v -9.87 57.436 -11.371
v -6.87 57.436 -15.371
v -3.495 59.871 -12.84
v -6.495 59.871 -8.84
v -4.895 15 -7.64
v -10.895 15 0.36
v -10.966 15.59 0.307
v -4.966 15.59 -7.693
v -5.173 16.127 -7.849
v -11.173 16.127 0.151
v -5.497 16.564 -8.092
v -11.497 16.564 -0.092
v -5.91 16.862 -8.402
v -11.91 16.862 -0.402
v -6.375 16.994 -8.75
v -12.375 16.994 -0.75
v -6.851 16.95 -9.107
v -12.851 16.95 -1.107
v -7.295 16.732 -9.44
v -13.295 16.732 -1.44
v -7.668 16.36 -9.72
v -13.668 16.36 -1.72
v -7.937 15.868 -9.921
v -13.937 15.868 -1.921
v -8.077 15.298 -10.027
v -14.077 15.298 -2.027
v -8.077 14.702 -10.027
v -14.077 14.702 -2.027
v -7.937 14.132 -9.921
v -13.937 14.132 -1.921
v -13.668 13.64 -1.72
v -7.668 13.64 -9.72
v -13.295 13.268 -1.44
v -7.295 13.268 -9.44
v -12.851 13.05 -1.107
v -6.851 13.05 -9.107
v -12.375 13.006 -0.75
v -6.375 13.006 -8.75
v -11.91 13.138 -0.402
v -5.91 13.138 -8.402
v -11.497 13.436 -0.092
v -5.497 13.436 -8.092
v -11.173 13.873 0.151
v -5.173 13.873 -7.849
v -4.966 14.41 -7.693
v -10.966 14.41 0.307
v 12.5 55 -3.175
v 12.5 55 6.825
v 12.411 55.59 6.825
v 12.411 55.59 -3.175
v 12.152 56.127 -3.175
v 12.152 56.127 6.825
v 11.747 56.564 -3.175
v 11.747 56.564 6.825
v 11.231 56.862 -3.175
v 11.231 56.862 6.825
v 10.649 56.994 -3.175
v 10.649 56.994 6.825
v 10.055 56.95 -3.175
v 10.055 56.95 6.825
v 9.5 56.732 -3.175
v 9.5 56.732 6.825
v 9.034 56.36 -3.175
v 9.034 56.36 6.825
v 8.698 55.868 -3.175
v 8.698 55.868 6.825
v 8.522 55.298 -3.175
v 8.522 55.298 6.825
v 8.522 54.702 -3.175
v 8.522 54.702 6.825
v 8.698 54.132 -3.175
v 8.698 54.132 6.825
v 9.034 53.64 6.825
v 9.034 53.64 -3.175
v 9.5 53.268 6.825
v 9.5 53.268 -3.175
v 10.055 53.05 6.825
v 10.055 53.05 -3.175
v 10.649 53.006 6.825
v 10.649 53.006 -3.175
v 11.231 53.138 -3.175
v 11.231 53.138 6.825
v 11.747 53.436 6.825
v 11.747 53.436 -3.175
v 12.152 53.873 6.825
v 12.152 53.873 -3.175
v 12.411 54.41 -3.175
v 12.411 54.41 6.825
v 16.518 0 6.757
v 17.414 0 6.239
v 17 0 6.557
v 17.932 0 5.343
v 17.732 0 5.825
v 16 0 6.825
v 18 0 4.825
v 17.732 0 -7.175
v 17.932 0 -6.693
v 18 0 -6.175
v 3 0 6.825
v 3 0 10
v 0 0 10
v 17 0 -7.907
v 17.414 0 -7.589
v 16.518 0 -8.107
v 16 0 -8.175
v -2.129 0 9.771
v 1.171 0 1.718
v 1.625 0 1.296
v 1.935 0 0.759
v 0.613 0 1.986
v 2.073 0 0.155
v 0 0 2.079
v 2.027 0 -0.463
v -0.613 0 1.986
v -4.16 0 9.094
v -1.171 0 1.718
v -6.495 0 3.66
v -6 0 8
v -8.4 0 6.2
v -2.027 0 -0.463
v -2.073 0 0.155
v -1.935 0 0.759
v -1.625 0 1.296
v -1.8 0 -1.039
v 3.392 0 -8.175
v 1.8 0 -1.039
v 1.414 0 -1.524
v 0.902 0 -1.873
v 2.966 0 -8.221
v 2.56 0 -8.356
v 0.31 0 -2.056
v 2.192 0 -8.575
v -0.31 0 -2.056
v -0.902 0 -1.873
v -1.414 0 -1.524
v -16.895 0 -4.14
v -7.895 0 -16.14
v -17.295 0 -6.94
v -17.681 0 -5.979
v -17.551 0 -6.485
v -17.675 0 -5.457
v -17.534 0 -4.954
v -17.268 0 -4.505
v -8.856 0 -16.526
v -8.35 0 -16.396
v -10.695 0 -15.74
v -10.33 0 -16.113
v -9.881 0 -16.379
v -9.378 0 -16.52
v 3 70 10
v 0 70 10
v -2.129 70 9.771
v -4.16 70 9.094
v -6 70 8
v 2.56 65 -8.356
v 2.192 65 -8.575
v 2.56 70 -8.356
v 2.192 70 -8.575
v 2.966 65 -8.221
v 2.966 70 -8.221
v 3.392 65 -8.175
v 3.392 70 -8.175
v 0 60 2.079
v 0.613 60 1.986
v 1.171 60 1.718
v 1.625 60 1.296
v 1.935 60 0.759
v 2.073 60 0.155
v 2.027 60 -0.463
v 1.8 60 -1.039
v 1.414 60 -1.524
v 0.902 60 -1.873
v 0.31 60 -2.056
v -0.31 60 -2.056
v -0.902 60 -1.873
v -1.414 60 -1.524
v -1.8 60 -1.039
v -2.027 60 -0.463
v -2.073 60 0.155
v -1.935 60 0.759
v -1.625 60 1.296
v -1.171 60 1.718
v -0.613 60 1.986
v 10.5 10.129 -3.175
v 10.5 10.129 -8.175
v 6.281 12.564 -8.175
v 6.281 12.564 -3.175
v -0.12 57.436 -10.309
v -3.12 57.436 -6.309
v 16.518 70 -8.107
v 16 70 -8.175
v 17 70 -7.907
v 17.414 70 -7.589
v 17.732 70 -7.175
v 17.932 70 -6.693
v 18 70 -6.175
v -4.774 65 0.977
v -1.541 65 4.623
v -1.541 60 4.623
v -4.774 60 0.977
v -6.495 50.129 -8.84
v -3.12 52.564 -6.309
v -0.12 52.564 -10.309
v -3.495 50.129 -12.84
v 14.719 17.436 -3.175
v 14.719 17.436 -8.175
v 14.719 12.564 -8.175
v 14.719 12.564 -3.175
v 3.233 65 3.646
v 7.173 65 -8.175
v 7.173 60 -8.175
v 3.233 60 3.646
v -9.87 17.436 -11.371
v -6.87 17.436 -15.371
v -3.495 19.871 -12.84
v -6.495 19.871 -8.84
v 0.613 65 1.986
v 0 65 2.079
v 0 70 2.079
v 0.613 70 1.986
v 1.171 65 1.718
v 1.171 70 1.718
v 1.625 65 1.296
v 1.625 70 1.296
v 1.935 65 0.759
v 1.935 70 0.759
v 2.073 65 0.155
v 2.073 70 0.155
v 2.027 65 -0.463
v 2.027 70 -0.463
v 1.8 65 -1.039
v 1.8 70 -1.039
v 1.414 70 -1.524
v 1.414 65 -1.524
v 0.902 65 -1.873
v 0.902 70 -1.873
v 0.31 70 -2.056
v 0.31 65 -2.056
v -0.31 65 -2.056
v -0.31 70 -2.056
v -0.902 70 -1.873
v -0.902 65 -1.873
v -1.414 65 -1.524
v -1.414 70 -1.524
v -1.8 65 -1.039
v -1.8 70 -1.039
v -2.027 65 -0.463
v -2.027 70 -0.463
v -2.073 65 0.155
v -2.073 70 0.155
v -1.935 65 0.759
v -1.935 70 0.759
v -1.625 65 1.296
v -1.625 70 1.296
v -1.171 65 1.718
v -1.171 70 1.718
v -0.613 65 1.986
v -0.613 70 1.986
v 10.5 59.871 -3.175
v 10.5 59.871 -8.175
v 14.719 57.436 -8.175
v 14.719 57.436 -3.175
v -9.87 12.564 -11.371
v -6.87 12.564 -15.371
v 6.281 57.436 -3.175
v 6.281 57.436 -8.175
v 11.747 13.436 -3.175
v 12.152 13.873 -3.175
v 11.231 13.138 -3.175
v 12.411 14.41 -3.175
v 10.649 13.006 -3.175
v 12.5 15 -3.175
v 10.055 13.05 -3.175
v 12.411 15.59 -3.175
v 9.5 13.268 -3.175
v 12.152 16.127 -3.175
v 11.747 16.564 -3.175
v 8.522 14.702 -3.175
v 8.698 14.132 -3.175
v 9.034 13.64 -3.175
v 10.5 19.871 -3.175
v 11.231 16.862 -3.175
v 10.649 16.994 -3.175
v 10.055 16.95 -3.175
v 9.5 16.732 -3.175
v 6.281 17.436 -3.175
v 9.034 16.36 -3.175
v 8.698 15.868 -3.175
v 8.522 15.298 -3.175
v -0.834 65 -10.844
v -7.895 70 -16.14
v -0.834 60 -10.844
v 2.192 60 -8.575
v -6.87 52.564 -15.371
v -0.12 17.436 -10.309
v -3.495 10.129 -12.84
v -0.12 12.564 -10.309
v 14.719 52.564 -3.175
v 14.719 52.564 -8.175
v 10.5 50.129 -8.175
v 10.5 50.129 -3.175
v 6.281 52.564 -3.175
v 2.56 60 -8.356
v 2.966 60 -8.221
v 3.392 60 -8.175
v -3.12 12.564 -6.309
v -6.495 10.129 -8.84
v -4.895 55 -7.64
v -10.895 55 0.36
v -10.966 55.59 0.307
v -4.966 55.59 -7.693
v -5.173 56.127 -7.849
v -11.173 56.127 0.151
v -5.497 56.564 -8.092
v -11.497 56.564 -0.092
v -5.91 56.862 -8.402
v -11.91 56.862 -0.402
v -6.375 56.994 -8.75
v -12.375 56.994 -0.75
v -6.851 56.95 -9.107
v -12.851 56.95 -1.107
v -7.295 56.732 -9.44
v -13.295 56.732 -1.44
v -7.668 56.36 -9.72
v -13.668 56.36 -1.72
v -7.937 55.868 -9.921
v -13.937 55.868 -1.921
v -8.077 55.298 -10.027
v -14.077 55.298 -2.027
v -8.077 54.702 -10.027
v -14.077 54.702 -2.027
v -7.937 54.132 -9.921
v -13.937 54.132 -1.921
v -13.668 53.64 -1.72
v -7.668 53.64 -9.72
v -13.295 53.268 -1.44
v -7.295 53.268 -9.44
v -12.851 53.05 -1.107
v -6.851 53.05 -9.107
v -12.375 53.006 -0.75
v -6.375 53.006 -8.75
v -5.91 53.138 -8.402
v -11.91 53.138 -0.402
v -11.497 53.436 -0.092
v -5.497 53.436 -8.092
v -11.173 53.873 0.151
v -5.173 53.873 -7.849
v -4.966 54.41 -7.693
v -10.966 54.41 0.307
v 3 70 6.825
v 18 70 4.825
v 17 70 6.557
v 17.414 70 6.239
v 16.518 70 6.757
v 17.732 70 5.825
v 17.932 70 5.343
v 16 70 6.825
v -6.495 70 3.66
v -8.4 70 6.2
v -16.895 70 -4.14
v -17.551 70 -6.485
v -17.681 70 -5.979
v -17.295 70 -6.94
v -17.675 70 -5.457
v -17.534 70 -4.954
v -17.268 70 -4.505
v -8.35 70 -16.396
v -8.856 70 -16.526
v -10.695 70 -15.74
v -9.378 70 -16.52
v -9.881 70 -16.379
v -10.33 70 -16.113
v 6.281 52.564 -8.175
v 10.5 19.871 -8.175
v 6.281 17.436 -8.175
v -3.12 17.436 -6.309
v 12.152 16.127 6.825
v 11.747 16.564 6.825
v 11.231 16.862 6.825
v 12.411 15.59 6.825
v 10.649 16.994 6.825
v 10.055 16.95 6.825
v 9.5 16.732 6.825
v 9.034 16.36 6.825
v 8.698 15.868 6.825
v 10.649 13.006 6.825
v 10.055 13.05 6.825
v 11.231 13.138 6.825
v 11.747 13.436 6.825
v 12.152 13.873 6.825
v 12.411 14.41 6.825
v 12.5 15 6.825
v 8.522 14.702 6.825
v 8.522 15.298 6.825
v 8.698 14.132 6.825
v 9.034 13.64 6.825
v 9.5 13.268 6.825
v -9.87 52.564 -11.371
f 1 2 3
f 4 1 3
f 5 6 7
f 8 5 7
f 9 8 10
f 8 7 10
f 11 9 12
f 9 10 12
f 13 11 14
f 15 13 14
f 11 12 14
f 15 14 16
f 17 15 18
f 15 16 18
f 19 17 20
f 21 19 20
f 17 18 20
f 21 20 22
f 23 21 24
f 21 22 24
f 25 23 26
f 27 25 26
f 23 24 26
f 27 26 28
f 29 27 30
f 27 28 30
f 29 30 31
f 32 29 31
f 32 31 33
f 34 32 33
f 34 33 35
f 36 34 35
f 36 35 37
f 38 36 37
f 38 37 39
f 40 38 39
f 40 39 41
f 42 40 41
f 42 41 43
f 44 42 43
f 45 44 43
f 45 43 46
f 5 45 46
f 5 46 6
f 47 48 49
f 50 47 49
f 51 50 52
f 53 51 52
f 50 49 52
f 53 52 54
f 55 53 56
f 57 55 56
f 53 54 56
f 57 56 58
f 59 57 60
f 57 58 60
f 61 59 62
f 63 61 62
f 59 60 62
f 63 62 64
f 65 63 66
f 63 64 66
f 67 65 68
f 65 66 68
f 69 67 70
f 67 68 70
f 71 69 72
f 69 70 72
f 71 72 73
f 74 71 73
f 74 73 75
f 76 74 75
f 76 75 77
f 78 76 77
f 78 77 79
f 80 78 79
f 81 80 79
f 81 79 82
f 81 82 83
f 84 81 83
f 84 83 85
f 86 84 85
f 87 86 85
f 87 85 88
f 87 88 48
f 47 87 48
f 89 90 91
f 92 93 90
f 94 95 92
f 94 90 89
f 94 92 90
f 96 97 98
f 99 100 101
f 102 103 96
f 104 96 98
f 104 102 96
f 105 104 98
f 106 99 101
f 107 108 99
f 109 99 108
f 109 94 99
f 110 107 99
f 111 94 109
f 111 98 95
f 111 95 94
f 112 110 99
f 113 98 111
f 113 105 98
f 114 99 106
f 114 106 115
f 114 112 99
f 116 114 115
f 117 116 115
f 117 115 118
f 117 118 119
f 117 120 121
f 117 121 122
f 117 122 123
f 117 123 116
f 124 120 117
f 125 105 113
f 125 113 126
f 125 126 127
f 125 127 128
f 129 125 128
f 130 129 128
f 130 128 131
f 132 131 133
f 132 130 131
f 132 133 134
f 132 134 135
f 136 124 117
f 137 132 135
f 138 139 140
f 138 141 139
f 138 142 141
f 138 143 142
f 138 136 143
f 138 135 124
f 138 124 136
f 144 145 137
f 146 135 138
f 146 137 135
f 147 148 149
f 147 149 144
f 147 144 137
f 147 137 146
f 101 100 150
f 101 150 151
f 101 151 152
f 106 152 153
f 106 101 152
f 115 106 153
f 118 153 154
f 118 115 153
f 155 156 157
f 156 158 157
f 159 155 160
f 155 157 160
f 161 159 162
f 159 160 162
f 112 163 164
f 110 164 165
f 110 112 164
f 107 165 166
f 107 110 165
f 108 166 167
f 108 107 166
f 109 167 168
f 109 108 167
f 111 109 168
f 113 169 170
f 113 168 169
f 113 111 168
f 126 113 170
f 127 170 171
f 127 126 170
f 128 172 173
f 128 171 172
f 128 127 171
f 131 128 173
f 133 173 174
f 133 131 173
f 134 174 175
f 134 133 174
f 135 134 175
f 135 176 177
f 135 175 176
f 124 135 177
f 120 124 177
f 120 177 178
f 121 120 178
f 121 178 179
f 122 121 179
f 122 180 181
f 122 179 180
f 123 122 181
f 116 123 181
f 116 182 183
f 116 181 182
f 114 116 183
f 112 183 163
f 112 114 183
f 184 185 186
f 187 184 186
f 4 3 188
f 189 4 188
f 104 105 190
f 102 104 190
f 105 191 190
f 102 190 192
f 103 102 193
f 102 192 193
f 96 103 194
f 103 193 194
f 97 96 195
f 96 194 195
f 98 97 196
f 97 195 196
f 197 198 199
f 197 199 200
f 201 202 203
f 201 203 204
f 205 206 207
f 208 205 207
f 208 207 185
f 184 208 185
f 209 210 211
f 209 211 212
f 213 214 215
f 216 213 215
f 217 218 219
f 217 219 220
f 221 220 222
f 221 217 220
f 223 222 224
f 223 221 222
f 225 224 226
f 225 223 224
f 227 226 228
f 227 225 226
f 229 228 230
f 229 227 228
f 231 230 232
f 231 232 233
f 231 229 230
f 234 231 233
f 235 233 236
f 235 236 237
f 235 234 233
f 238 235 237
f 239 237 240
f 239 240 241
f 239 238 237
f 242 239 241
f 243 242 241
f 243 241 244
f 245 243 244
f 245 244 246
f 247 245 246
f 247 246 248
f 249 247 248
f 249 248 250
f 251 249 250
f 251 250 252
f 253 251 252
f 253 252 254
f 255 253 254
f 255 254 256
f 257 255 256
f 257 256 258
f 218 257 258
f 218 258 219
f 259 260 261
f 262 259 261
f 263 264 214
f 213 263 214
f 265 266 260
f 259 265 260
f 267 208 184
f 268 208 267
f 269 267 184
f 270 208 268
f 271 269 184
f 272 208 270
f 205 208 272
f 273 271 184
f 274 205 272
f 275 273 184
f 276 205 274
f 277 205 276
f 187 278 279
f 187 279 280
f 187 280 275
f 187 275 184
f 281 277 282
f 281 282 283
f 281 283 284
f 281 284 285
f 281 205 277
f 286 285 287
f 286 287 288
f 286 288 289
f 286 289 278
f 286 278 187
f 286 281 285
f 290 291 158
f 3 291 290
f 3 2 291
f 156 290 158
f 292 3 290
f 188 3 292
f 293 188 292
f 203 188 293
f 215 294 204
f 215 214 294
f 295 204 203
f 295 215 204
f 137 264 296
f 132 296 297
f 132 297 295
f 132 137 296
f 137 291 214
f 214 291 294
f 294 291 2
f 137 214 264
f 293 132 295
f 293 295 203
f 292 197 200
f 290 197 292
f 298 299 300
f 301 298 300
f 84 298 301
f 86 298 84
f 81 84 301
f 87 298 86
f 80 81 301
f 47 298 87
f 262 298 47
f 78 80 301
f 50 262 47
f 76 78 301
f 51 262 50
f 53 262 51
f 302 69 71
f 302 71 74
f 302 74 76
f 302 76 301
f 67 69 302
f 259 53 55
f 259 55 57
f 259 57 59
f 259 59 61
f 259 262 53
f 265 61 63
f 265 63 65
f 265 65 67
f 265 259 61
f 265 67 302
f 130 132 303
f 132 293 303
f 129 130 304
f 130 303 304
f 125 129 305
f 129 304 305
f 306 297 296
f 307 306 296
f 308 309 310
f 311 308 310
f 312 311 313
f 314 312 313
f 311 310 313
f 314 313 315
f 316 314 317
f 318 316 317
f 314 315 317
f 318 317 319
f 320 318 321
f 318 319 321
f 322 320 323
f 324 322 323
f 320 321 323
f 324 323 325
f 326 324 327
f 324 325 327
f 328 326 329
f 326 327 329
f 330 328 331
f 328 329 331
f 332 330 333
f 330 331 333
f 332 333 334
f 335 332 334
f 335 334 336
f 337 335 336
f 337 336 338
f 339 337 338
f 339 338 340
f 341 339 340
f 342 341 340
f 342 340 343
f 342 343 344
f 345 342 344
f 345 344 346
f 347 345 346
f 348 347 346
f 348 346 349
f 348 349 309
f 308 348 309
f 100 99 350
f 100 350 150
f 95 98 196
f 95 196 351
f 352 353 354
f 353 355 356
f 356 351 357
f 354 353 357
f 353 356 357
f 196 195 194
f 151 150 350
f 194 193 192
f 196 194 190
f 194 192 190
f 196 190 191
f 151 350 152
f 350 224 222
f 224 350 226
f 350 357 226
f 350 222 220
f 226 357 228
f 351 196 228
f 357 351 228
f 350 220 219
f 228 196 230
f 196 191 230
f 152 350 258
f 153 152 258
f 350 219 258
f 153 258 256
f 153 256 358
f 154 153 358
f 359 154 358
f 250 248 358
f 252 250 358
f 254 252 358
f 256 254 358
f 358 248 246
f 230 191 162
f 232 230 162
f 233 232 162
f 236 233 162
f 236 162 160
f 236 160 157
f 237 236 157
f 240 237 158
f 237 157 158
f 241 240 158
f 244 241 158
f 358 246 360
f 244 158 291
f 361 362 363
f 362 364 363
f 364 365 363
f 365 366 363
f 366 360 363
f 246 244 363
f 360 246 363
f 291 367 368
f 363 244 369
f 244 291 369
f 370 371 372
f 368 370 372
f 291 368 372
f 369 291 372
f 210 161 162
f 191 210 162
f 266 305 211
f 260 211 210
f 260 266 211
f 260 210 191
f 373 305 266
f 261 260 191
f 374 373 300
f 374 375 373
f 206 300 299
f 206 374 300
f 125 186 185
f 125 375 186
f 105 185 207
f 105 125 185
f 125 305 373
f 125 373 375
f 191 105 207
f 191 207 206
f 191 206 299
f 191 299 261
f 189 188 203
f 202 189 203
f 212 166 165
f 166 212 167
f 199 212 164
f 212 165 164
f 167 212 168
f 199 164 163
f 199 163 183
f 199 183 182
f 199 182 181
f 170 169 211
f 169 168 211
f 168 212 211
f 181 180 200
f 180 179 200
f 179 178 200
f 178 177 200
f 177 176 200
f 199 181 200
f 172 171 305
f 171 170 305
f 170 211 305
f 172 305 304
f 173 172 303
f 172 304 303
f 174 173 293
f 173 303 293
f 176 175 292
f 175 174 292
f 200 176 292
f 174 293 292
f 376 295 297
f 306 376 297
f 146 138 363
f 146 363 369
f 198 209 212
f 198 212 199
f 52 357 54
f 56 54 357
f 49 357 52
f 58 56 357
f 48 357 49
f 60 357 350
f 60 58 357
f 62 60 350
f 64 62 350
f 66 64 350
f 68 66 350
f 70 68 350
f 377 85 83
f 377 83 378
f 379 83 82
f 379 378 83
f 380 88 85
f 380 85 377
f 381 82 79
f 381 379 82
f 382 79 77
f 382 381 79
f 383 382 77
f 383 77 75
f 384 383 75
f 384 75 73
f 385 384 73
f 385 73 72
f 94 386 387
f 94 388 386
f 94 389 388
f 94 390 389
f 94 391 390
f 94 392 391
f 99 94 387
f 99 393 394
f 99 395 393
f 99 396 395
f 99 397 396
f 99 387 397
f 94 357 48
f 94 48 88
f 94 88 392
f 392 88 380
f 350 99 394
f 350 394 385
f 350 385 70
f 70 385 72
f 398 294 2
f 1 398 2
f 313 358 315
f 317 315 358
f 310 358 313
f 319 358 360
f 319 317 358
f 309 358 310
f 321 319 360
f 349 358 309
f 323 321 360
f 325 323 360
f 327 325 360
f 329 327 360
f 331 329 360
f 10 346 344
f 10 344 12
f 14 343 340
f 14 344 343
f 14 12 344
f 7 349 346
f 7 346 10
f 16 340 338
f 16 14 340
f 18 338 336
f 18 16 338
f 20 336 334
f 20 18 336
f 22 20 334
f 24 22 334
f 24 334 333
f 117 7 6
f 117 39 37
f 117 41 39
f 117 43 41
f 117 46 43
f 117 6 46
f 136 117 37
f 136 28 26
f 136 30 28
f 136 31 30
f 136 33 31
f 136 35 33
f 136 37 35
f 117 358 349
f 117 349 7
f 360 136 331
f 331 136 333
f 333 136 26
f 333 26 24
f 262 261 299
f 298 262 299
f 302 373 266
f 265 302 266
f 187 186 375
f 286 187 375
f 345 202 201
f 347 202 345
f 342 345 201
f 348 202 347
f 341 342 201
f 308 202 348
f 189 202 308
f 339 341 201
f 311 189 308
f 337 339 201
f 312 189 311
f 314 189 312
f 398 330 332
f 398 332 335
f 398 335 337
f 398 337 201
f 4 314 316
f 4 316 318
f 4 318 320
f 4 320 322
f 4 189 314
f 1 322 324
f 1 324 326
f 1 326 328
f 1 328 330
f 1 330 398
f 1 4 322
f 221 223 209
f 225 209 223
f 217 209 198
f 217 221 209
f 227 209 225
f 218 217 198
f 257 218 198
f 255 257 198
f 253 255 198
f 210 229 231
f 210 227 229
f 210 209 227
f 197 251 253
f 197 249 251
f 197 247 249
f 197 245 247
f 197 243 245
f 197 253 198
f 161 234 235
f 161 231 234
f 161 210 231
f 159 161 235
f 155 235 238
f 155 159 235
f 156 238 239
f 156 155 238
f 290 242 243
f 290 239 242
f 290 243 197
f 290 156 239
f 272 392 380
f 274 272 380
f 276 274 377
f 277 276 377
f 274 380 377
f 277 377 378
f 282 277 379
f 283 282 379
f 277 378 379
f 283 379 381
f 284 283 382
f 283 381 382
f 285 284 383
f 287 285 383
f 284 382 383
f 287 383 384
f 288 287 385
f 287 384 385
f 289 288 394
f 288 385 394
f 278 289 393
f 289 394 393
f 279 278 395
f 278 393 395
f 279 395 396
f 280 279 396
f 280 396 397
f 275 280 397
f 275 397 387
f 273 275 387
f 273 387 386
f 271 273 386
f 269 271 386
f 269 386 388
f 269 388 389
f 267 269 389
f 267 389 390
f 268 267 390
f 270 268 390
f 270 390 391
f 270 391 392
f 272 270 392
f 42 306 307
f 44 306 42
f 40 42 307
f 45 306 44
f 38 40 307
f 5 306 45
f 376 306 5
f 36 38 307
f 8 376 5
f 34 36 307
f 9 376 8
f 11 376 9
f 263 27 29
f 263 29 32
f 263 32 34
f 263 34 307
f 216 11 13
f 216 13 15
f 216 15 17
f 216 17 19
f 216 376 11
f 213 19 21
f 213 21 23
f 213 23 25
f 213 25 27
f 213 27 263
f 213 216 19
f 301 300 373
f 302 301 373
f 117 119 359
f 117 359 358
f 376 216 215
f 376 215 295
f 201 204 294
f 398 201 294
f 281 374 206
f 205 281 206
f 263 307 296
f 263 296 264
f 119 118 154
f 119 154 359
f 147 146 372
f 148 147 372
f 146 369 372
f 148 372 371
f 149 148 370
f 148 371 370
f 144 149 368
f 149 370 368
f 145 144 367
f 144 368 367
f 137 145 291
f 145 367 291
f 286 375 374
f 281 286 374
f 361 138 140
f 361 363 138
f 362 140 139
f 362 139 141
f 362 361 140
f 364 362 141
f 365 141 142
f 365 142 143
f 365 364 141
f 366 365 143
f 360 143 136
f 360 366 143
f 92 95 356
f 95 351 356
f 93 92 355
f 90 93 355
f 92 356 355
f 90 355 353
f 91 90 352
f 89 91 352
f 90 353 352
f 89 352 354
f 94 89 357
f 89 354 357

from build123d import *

# Parameters (mm, degrees)
SKETCH1_R           = 2.0788
BOSS_EXTRUDE1_DEPTH = 70
SKETCH2_R           = 2
CUT_EXTRUDE1_DEPTH  = 15
SKETCH3_R           = 2
CUT_EXTRUDE2_DEPTH  = 15
CUT_EXTRUDE3_DEPTH  = 5
CUT_EXTRUDE4_DEPTH  = 5
CUT_EXTRUDE5_START  = -5
CUT_EXTRUDE5_DEPTH  = 5
FILLET1_R           = 2


with BuildPart() as part:
    # Sketch1 → Boss-Extrude1 (new body)
    with BuildSketch(Plane(origin=(0, 0, 0), x_dir=(1, 0, 0), z_dir=(0, 1, 0))):
        with BuildLine():
            Line((-18.495, 5.34), (-9.495, 17.34))
            Line((-9.495, 17.34), (2.725, 8.175))
            Line((2.725, 8.175), (18, 8.175))
            Line((18, 8.175), (18, -6.825))
            Line((18, -6.825), (3, -6.825))
            Line((3, -6.825), (3, -10))
            Line((3, -10), (0, -10))
            ThreePointArc((0, -10), (-3.16227766, -9.486832981), (-6, -8))
            Line((-6, -8), (-8.4, -6.2))
            Line((-8.4, -6.2), (-6.495, -3.66))
            Line((-6.495, -3.66), (-18.495, 5.34))
        make_face()
        with Locations(Location((0, 0, 0), (0, 0, 270))):
            Circle(SKETCH1_R, mode=Mode.SUBTRACT)
    extrude(amount=BOSS_EXTRUDE1_DEPTH)

    # Sketch2 → Cut-Extrude1 (cut)
    with BuildSketch(Plane.XY.offset(6.825)):
        with Locations((10.5, 15)):
            Circle(SKETCH2_R)
        with Locations((10.5, 55)):
            Circle(SKETCH2_R)
    extrude(amount=-CUT_EXTRUDE1_DEPTH, mode=Mode.SUBTRACT)

    # Sketch3 → Cut-Extrude2 (cut)
    with BuildSketch(Plane(origin=(-4.095, 0, 5.46), x_dir=(0.8000000000000002, 0, 0.5999999999999999), z_dir=(-0.5999999999999999, 0, 0.8000000000000003))):
        with Locations((-10.5, 15)):
            Circle(SKETCH3_R)
        with Locations((-10.5, 55)):
            Circle(SKETCH3_R)
    extrude(amount=-CUT_EXTRUDE2_DEPTH, mode=Mode.SUBTRACT)

    # Sketch4 → Cut-Extrude3 (cut)
    with BuildSketch(Plane(origin=(4.905, 0, -6.54), x_dir=(-0.8000000000000002, 0, -0.5999999999999998), z_dir=(0.5999999999999998, 0, -0.8000000000000002))):
        Polygon((10.5, 59.871392896), (6.28125, 57.435696448), (6.28125, 52.564303552), (10.5, 50.128607104), (14.71875, 52.564303552), (14.71875, 57.435696448), align=None)
        Polygon((10.5, 10.128607104), (14.71875, 12.564303552), (14.71875, 17.435696448), (10.5, 19.871392896), (6.28125, 17.435696448), (6.28125, 12.564303552), align=None)
    extrude(amount=-CUT_EXTRUDE3_DEPTH, mode=Mode.SUBTRACT)

    # Sketch5 → Cut-Extrude4 (cut)
    with BuildSketch(Plane(origin=(0, 0, -8.175), x_dir=(-1, 0, 0), z_dir=(0, 0, -1))):
        Polygon((-10.5, 50.128607104), (-6.28125, 52.564303552), (-6.28125, 57.435696448), (-10.5, 59.871392896), (-14.71875, 57.435696448), (-14.71875, 52.564303552), align=None)
        Polygon((-10.5, 10.128607104), (-6.28125, 12.564303552), (-6.28125, 17.435696448), (-10.5, 19.871392896), (-14.71875, 17.435696448), (-14.71875, 12.564303552), align=None)
    extrude(amount=-CUT_EXTRUDE4_DEPTH, mode=Mode.SUBTRACT)

    # Sketch7 → Cut-Extrude5 (cut)
    with BuildSketch(Plane(origin=(0, 70, 0), x_dir=(1, 0, 0), z_dir=(0, 1, 0)).offset(CUT_EXTRUDE5_START)):
        Polygon((-4.773906582, -0.97690802), (-0.83361646, 10.843962345), (2.725, 8.175), (7.173270575, 8.175), (3.232980454, -3.645870365), (-1.540926128, -4.622778385), align=None)
    extrude(amount=-CUT_EXTRUDE5_DEPTH, mode=Mode.SUBTRACT)

    # Fillet1
    fillet1_edges = [part.edges().sort_by_distance(p)[0] for p in [
        (2.725, 30, -8.175),
        (-18.495, 35, -5.34),
        (-9.495, 35, -17.34),
        (2.725, 67.5, -8.175),
        (18, 35, -8.175),
        (18, 35, 6.825),
    ]]
    fillet(fillet1_edges, radius=FILLET1_R)


solid = part.part
